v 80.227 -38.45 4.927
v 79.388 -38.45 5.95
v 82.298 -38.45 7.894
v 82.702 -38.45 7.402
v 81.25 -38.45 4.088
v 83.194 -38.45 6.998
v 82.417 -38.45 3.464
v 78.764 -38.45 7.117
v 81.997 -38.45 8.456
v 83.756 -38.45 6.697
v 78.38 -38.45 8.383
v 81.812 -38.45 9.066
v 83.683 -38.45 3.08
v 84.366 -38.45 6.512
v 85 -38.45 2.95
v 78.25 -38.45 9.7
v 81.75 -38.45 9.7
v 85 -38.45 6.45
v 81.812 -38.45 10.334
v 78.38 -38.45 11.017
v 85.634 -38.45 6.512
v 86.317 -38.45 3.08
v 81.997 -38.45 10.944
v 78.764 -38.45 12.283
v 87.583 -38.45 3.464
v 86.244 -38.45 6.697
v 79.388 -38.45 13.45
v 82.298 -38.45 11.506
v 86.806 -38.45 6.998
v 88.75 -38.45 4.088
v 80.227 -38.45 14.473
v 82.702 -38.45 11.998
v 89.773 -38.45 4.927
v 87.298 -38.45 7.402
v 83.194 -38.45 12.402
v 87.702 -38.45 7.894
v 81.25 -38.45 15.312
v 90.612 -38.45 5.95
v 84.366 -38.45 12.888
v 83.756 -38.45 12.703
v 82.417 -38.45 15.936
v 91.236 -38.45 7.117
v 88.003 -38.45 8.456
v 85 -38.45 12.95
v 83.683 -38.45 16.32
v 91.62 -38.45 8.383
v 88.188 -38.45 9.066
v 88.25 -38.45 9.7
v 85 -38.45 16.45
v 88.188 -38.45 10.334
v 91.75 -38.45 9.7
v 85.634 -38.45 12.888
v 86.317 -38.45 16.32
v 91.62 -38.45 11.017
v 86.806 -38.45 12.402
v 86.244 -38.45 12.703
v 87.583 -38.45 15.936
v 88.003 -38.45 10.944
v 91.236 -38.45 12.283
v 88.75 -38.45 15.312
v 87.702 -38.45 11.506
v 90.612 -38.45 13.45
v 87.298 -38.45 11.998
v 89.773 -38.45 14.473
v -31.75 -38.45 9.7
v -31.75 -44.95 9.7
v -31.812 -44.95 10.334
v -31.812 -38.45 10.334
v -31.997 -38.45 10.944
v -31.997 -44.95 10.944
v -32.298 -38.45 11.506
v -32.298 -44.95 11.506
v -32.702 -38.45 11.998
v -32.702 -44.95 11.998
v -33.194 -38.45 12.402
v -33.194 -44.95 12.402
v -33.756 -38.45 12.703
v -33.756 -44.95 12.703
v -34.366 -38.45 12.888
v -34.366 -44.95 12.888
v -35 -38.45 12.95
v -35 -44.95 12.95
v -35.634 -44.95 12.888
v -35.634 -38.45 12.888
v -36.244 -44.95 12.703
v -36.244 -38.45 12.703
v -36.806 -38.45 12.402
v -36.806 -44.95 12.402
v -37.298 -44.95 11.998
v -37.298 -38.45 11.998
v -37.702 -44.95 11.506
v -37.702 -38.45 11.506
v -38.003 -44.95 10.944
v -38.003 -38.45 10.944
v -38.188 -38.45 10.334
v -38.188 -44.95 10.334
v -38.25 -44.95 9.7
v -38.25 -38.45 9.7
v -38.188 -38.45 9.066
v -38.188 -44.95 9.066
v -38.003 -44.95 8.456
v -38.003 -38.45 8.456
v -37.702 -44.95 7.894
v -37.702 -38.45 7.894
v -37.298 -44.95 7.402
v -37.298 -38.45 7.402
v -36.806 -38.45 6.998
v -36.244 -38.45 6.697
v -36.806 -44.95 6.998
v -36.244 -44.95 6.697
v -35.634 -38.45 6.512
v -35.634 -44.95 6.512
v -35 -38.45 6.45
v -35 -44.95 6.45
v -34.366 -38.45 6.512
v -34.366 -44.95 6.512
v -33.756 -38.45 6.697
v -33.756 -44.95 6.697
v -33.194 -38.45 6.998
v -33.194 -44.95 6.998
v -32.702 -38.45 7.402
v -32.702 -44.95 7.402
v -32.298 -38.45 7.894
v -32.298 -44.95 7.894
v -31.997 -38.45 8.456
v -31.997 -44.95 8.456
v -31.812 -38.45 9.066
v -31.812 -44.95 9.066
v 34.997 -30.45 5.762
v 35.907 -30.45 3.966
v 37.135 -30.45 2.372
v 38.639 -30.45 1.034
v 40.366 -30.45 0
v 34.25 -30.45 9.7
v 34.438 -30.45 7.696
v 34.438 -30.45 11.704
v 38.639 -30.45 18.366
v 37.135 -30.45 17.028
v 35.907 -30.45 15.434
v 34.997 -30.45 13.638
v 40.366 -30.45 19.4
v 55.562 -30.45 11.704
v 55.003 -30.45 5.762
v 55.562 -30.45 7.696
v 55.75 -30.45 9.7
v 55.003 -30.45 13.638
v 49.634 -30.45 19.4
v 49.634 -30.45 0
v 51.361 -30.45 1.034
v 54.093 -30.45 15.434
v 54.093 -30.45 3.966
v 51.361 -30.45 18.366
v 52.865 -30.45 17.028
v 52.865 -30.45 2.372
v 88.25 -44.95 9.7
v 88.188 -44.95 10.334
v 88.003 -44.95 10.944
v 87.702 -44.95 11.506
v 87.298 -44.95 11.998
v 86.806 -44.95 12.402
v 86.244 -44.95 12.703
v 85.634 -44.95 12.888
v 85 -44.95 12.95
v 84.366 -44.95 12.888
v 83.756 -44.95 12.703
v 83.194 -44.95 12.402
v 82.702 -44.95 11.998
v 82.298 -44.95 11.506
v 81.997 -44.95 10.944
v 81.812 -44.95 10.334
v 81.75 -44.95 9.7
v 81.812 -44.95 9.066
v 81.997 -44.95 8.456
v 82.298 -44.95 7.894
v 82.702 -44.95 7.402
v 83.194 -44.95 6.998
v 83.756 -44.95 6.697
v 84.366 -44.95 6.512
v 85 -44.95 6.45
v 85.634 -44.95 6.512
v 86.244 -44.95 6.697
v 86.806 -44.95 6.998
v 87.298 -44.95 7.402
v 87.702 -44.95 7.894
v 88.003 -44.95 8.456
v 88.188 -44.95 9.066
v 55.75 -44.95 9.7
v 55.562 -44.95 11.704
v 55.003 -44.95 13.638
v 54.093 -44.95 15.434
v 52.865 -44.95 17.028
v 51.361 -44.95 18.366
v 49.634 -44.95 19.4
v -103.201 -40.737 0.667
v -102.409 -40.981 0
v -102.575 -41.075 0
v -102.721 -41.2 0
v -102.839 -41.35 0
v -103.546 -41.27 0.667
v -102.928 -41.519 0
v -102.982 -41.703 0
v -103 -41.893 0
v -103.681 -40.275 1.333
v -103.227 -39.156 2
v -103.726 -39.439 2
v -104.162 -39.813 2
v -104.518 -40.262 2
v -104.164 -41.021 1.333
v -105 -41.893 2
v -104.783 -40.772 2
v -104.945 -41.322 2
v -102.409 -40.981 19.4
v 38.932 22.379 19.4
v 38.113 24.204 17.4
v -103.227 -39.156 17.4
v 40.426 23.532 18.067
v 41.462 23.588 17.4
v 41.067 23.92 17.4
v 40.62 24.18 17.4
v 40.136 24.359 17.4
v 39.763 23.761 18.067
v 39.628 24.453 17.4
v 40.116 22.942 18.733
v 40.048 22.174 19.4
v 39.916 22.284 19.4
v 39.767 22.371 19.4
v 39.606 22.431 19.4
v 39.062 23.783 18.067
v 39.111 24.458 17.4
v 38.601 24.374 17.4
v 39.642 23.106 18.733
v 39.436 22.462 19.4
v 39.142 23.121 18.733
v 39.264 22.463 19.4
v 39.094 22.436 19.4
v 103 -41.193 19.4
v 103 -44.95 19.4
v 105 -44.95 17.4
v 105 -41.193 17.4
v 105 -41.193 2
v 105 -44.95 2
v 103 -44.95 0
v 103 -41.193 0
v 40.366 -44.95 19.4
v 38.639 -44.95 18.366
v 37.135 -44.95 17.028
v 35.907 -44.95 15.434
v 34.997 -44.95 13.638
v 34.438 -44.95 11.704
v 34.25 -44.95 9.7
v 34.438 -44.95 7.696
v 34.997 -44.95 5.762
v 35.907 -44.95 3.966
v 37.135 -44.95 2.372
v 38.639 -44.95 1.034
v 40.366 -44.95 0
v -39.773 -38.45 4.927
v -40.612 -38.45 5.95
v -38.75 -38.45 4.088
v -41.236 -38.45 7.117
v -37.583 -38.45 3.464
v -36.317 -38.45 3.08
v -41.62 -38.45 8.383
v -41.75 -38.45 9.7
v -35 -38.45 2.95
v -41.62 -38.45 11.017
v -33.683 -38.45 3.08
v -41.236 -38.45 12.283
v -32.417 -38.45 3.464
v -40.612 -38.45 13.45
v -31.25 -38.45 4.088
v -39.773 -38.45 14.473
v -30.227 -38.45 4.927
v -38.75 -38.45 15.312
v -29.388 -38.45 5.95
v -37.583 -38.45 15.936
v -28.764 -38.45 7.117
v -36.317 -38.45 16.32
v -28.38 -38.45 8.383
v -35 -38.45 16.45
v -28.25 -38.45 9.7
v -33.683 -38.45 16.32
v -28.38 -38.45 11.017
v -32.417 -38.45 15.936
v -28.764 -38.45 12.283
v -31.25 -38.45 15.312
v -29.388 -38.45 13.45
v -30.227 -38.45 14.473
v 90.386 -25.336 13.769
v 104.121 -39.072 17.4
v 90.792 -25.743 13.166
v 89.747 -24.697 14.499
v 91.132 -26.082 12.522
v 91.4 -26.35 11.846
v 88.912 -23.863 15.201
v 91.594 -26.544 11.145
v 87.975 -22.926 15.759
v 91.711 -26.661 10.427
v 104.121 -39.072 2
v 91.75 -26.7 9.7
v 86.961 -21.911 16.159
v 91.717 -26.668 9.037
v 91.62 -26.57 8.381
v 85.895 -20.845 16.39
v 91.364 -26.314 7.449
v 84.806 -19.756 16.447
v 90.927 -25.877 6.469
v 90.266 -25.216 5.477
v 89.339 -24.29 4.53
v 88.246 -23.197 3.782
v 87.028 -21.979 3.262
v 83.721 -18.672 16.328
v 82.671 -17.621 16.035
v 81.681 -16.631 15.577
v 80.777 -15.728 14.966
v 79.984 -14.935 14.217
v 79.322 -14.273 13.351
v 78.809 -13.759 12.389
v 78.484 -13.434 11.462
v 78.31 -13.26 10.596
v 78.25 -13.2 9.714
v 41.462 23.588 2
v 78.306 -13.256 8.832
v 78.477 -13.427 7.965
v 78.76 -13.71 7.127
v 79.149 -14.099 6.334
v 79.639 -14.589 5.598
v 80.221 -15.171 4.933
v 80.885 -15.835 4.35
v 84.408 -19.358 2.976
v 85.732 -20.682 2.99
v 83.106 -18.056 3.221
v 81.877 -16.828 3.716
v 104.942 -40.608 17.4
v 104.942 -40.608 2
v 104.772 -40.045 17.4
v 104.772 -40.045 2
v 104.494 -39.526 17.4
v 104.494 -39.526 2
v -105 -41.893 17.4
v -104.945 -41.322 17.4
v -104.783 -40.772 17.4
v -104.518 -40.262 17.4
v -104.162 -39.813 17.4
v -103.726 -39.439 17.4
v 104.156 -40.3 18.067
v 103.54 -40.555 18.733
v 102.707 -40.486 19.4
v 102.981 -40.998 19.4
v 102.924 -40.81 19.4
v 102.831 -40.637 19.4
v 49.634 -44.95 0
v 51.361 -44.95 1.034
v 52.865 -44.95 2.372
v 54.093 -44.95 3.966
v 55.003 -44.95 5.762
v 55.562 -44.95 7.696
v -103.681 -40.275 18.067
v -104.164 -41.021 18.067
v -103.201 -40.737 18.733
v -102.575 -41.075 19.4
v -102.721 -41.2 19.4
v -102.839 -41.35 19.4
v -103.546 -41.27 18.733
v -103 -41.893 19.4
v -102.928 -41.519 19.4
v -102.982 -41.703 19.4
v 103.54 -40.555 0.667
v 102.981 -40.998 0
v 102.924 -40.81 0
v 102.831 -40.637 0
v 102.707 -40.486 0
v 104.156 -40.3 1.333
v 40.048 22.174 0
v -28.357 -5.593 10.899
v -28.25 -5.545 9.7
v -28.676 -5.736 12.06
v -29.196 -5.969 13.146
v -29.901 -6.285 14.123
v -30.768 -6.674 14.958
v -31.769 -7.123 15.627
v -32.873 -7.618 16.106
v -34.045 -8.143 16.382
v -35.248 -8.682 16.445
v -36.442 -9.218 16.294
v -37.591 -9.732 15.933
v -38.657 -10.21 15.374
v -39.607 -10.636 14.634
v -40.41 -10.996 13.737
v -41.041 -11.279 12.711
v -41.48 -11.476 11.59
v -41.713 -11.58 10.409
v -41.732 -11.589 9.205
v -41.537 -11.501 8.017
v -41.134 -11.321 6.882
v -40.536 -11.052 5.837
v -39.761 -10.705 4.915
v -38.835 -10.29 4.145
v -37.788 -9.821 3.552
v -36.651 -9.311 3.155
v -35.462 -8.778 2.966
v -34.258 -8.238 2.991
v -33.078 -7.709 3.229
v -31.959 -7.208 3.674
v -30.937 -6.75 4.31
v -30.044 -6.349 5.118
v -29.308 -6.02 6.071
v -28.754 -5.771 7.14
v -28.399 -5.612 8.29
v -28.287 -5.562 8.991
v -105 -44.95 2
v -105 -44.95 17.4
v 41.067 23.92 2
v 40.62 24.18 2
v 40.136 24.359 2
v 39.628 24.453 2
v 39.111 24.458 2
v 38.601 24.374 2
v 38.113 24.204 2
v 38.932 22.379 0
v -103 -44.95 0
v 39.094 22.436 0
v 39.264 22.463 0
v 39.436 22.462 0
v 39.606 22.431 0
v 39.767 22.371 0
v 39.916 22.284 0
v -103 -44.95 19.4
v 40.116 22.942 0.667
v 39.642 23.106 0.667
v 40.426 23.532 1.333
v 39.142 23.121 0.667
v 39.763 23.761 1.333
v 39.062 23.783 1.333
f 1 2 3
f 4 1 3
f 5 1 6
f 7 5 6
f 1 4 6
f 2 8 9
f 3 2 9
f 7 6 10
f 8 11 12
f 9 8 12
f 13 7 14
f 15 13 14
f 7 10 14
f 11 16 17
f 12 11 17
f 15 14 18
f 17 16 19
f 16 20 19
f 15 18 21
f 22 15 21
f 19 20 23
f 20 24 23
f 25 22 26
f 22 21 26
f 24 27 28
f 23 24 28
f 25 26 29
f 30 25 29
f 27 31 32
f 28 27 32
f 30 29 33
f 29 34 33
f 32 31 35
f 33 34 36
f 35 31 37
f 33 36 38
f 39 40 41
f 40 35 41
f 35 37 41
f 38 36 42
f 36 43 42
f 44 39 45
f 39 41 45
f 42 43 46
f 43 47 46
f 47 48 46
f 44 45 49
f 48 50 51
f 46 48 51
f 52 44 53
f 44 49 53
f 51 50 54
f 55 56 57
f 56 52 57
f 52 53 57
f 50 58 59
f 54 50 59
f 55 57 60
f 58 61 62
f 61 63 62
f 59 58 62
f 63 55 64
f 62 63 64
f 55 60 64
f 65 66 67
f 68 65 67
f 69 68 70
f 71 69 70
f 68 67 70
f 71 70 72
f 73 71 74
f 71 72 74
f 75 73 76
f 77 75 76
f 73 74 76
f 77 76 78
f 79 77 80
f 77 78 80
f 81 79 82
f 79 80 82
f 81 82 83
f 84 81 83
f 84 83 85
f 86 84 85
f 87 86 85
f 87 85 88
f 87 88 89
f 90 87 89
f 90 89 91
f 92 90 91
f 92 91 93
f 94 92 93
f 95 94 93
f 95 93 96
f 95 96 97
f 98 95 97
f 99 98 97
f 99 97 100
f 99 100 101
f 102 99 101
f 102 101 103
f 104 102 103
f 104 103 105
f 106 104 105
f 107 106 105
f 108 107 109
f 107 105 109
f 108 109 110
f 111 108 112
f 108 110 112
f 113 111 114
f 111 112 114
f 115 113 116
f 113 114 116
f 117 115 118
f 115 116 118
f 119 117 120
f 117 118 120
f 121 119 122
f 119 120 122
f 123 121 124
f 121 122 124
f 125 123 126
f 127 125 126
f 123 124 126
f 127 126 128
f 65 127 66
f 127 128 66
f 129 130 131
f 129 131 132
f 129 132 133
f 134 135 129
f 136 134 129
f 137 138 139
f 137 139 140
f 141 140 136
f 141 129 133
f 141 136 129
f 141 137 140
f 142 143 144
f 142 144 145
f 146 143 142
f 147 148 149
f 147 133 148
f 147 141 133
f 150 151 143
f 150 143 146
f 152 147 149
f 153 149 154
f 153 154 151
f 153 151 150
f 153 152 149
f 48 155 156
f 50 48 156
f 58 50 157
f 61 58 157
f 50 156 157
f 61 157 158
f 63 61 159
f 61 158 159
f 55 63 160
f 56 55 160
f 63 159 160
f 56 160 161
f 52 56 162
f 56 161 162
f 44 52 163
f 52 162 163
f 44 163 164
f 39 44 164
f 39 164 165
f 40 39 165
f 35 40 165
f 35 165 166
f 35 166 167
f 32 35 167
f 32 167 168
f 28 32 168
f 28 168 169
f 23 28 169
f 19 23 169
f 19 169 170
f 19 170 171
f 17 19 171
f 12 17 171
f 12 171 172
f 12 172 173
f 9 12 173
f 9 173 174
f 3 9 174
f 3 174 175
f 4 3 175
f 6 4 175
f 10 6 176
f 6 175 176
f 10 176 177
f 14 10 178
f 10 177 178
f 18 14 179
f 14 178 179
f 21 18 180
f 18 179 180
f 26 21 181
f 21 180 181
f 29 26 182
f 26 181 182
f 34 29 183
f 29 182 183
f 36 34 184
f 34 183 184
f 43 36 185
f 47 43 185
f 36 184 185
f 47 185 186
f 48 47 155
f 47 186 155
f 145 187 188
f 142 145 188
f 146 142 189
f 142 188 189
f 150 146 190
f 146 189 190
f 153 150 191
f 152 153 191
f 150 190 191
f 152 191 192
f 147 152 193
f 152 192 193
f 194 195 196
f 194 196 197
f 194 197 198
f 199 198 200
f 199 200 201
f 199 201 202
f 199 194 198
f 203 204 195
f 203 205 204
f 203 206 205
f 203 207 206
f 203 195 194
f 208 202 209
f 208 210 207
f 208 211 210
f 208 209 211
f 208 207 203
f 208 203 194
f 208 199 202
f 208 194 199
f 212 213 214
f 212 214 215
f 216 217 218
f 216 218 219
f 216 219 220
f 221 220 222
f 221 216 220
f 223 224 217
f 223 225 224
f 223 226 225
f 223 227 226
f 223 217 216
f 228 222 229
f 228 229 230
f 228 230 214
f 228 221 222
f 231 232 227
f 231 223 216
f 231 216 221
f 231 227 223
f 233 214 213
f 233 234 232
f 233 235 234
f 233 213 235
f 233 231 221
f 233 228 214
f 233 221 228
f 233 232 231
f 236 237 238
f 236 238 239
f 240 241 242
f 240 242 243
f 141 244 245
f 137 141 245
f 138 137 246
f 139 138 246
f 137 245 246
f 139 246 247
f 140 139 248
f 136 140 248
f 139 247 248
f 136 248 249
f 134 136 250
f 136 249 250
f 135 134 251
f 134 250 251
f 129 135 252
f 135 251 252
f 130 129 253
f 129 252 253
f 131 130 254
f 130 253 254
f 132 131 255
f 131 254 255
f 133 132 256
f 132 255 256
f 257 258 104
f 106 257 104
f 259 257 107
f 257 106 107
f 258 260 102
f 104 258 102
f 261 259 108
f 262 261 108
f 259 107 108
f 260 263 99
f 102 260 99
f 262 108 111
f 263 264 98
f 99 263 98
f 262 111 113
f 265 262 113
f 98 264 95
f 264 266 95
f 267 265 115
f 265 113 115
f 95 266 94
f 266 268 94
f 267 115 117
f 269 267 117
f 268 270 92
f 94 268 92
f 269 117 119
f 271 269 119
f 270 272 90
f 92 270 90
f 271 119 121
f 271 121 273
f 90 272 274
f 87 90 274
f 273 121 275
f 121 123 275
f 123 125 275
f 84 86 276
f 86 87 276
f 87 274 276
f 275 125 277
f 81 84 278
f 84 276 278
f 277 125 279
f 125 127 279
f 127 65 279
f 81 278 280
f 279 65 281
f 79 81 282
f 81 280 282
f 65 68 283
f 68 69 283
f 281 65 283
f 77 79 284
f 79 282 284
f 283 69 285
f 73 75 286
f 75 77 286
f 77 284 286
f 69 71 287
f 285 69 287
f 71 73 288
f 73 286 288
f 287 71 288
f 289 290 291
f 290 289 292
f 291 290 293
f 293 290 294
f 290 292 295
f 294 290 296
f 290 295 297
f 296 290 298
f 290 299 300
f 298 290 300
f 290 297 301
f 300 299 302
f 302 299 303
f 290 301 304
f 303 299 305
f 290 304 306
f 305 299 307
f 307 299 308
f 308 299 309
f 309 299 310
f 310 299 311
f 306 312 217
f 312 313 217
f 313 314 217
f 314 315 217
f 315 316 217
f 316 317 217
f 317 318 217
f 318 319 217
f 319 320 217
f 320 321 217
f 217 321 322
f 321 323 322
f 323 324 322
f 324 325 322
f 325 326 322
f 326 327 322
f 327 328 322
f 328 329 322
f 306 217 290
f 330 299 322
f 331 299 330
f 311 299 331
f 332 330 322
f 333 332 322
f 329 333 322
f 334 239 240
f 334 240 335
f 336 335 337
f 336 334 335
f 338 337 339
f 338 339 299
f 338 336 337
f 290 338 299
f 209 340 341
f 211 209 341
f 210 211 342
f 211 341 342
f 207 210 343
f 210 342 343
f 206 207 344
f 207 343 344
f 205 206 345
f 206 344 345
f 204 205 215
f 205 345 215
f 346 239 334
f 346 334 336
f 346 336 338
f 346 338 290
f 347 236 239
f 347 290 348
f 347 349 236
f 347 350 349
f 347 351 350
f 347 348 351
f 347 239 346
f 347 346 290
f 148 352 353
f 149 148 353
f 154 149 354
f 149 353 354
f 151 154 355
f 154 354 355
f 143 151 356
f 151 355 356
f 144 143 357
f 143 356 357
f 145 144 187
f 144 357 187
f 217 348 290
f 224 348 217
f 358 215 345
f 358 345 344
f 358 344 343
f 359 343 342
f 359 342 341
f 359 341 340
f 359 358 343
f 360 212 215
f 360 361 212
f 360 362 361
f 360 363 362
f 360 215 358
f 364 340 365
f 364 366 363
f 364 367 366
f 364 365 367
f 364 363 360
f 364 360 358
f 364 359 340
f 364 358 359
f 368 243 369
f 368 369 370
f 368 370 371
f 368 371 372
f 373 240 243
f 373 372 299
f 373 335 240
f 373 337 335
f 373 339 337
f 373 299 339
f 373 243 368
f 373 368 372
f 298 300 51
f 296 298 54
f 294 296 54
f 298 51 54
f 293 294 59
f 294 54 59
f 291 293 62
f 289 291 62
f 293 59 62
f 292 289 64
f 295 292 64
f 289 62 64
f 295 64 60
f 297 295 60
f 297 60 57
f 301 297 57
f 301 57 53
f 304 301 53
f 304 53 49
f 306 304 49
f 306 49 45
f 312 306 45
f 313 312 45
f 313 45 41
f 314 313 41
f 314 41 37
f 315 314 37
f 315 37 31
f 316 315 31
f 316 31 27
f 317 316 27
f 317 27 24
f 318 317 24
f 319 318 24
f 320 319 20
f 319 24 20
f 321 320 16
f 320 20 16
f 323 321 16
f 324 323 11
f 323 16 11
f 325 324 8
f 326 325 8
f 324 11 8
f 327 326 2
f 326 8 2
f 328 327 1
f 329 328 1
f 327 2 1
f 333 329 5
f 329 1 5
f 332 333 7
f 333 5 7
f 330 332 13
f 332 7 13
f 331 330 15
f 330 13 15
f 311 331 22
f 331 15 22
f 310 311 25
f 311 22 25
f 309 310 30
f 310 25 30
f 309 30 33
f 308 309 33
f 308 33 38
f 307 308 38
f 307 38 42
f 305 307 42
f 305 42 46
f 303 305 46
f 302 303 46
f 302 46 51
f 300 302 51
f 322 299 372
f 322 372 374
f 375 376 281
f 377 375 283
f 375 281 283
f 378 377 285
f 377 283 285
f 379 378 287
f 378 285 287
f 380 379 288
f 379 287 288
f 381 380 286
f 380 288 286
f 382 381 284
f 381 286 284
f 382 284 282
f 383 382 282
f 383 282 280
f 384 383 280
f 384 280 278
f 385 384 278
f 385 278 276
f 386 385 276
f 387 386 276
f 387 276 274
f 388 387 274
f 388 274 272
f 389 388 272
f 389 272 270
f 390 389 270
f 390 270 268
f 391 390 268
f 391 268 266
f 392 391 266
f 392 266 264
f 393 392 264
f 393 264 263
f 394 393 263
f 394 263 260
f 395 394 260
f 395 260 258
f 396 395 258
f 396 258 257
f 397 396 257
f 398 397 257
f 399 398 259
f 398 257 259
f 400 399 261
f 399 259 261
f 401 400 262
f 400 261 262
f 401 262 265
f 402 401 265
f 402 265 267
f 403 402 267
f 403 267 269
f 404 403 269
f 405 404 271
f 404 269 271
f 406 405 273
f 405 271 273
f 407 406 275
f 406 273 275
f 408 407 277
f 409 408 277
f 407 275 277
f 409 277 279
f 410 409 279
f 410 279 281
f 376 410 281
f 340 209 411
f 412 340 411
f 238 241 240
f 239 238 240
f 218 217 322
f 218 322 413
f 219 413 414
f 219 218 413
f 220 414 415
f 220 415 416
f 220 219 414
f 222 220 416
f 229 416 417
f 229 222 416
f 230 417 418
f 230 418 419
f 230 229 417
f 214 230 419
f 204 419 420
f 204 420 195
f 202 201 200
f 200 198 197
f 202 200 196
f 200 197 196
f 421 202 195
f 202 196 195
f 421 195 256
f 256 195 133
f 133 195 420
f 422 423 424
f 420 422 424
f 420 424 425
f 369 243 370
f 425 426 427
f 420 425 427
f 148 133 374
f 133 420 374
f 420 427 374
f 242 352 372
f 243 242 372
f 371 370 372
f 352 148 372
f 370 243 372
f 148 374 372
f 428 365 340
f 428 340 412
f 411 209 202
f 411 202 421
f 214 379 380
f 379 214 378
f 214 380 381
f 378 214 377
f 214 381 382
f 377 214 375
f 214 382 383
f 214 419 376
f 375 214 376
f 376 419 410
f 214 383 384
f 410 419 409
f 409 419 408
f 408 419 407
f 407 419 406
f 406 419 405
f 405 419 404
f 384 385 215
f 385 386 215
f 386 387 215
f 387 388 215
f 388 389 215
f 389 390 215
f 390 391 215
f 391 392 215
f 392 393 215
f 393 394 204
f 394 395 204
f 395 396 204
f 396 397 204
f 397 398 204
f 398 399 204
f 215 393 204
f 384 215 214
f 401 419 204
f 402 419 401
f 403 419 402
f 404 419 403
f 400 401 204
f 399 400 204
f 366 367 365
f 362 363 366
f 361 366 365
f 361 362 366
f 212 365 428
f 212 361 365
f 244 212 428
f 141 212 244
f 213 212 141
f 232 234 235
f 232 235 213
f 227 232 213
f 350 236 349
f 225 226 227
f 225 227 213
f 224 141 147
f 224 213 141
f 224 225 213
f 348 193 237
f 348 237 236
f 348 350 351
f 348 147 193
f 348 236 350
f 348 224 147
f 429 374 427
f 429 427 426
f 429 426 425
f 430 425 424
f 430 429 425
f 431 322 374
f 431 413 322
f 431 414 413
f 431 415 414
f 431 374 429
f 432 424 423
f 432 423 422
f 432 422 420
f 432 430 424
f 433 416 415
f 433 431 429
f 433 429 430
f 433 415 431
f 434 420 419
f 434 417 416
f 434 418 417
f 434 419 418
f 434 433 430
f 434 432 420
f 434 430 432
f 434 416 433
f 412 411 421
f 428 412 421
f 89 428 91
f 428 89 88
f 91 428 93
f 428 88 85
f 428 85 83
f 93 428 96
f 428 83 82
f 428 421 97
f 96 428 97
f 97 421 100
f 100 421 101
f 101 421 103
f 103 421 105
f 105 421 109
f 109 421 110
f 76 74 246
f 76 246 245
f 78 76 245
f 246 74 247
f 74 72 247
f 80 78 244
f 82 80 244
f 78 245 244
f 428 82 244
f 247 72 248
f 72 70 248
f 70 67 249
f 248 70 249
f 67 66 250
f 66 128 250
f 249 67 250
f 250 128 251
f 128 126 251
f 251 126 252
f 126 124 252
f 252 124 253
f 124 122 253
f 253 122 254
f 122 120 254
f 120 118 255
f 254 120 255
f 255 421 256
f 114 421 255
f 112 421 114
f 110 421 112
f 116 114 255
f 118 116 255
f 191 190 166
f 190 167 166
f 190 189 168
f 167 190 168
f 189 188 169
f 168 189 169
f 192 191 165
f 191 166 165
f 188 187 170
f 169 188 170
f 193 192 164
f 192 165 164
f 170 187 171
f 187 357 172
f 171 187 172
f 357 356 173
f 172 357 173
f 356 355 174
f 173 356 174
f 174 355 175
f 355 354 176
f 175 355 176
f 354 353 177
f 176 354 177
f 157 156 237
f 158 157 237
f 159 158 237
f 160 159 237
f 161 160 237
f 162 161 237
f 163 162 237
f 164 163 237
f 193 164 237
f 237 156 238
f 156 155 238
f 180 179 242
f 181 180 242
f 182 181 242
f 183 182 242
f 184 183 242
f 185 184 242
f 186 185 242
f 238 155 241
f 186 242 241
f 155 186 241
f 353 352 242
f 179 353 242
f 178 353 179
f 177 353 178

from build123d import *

# Parameters (mm, degrees)
F1_DEPTH  = 19.4
F2_R      = 3
F4_DEPTH  = 14.5
F5_R      = 3.25
F6_DEPTH  = 69.4177661804
F9_R      = 6.75
F10_DEPTH = 62.9177661804
F11_SIZE  = 2


with BuildPart() as f1:
    # F0 (on Top) → F1 (new body)
    with BuildSketch(Plane.XY):
        Polygon((-105, -39.9503339168), (-105, -44.9503339168), (105, -44.9503339168), (105, -39.9503339168), (40, 25.0496660832), align=None)
    extrude(amount=F1_DEPTH)

    # F2
    f2_edges = [f1.edges().sort_by_distance(p)[0] for p in [
        (40, 25.049666, 9.7),
        (105, -39.950334, 9.7),
        (-105, -39.950334, 9.7),
    ]]
    fillet(f2_edges, radius=F2_R)

    # F3 (on face) → F4 (cut)
    with BuildSketch(Plane.XZ.offset(44.9503339168)):
        with BuildLine():
            ThreePointArc((49.6338428976, 0), (54.0933027869, 3.9663846985), (55.75, 9.7))
            ThreePointArc((55.75, 9.7), (54.0933027869, 15.4336153015), (49.6338428976, 19.4))
            Line((49.6338428976, 19.4), (40.3661571024, 19.4))
            ThreePointArc((40.3661571024, 19.4), (34.25, 9.7), (40.3661571024, 0))
            Line((40.3661571024, 0), (49.6338428976, 0))
        make_face()
    extrude(amount=-F4_DEPTH, mode=Mode.SUBTRACT)

    # F5 (on face) → F6 (cut, through all)
    with BuildSketch(Plane.XZ.offset(44.9503339168)):
        with Locations((-35, 9.7000030801)):
            Circle(F5_R)
        with Locations((85, 9.7000030801)):
            Circle(F5_R)
    extrude(amount=-F6_DEPTH, mode=Mode.SUBTRACT)

    # F9 (on offset) → F10 (cut, through all)
    with BuildSketch(Plane.XZ.offset(38.4503339168)):
        with Locations((85, 9.7000030801)):
            Circle(F9_R)
        with Locations((-35, 9.7000030801)):
            Circle(F9_R)
    extrude(amount=-F10_DEPTH, mode=Mode.SUBTRACT)

    # F11
    f11_edges = [f1.edges().sort_by_distance(p)[0] for p in [
        (-105, -43.421739, 19.4),
        (-104.518085, -40.262424, 19.4),
        (-32.556871, -7.475828, 19.4),
        (39.883553, 24.416889, 19.4),
        (72.791617, -7.741951, 19.4),
        (105, -43.071654, 19.4),
        (72.791617, -7.741951, 0),
    ]]
    chamfer(f11_edges, length=F11_SIZE)


solid = f1.part
